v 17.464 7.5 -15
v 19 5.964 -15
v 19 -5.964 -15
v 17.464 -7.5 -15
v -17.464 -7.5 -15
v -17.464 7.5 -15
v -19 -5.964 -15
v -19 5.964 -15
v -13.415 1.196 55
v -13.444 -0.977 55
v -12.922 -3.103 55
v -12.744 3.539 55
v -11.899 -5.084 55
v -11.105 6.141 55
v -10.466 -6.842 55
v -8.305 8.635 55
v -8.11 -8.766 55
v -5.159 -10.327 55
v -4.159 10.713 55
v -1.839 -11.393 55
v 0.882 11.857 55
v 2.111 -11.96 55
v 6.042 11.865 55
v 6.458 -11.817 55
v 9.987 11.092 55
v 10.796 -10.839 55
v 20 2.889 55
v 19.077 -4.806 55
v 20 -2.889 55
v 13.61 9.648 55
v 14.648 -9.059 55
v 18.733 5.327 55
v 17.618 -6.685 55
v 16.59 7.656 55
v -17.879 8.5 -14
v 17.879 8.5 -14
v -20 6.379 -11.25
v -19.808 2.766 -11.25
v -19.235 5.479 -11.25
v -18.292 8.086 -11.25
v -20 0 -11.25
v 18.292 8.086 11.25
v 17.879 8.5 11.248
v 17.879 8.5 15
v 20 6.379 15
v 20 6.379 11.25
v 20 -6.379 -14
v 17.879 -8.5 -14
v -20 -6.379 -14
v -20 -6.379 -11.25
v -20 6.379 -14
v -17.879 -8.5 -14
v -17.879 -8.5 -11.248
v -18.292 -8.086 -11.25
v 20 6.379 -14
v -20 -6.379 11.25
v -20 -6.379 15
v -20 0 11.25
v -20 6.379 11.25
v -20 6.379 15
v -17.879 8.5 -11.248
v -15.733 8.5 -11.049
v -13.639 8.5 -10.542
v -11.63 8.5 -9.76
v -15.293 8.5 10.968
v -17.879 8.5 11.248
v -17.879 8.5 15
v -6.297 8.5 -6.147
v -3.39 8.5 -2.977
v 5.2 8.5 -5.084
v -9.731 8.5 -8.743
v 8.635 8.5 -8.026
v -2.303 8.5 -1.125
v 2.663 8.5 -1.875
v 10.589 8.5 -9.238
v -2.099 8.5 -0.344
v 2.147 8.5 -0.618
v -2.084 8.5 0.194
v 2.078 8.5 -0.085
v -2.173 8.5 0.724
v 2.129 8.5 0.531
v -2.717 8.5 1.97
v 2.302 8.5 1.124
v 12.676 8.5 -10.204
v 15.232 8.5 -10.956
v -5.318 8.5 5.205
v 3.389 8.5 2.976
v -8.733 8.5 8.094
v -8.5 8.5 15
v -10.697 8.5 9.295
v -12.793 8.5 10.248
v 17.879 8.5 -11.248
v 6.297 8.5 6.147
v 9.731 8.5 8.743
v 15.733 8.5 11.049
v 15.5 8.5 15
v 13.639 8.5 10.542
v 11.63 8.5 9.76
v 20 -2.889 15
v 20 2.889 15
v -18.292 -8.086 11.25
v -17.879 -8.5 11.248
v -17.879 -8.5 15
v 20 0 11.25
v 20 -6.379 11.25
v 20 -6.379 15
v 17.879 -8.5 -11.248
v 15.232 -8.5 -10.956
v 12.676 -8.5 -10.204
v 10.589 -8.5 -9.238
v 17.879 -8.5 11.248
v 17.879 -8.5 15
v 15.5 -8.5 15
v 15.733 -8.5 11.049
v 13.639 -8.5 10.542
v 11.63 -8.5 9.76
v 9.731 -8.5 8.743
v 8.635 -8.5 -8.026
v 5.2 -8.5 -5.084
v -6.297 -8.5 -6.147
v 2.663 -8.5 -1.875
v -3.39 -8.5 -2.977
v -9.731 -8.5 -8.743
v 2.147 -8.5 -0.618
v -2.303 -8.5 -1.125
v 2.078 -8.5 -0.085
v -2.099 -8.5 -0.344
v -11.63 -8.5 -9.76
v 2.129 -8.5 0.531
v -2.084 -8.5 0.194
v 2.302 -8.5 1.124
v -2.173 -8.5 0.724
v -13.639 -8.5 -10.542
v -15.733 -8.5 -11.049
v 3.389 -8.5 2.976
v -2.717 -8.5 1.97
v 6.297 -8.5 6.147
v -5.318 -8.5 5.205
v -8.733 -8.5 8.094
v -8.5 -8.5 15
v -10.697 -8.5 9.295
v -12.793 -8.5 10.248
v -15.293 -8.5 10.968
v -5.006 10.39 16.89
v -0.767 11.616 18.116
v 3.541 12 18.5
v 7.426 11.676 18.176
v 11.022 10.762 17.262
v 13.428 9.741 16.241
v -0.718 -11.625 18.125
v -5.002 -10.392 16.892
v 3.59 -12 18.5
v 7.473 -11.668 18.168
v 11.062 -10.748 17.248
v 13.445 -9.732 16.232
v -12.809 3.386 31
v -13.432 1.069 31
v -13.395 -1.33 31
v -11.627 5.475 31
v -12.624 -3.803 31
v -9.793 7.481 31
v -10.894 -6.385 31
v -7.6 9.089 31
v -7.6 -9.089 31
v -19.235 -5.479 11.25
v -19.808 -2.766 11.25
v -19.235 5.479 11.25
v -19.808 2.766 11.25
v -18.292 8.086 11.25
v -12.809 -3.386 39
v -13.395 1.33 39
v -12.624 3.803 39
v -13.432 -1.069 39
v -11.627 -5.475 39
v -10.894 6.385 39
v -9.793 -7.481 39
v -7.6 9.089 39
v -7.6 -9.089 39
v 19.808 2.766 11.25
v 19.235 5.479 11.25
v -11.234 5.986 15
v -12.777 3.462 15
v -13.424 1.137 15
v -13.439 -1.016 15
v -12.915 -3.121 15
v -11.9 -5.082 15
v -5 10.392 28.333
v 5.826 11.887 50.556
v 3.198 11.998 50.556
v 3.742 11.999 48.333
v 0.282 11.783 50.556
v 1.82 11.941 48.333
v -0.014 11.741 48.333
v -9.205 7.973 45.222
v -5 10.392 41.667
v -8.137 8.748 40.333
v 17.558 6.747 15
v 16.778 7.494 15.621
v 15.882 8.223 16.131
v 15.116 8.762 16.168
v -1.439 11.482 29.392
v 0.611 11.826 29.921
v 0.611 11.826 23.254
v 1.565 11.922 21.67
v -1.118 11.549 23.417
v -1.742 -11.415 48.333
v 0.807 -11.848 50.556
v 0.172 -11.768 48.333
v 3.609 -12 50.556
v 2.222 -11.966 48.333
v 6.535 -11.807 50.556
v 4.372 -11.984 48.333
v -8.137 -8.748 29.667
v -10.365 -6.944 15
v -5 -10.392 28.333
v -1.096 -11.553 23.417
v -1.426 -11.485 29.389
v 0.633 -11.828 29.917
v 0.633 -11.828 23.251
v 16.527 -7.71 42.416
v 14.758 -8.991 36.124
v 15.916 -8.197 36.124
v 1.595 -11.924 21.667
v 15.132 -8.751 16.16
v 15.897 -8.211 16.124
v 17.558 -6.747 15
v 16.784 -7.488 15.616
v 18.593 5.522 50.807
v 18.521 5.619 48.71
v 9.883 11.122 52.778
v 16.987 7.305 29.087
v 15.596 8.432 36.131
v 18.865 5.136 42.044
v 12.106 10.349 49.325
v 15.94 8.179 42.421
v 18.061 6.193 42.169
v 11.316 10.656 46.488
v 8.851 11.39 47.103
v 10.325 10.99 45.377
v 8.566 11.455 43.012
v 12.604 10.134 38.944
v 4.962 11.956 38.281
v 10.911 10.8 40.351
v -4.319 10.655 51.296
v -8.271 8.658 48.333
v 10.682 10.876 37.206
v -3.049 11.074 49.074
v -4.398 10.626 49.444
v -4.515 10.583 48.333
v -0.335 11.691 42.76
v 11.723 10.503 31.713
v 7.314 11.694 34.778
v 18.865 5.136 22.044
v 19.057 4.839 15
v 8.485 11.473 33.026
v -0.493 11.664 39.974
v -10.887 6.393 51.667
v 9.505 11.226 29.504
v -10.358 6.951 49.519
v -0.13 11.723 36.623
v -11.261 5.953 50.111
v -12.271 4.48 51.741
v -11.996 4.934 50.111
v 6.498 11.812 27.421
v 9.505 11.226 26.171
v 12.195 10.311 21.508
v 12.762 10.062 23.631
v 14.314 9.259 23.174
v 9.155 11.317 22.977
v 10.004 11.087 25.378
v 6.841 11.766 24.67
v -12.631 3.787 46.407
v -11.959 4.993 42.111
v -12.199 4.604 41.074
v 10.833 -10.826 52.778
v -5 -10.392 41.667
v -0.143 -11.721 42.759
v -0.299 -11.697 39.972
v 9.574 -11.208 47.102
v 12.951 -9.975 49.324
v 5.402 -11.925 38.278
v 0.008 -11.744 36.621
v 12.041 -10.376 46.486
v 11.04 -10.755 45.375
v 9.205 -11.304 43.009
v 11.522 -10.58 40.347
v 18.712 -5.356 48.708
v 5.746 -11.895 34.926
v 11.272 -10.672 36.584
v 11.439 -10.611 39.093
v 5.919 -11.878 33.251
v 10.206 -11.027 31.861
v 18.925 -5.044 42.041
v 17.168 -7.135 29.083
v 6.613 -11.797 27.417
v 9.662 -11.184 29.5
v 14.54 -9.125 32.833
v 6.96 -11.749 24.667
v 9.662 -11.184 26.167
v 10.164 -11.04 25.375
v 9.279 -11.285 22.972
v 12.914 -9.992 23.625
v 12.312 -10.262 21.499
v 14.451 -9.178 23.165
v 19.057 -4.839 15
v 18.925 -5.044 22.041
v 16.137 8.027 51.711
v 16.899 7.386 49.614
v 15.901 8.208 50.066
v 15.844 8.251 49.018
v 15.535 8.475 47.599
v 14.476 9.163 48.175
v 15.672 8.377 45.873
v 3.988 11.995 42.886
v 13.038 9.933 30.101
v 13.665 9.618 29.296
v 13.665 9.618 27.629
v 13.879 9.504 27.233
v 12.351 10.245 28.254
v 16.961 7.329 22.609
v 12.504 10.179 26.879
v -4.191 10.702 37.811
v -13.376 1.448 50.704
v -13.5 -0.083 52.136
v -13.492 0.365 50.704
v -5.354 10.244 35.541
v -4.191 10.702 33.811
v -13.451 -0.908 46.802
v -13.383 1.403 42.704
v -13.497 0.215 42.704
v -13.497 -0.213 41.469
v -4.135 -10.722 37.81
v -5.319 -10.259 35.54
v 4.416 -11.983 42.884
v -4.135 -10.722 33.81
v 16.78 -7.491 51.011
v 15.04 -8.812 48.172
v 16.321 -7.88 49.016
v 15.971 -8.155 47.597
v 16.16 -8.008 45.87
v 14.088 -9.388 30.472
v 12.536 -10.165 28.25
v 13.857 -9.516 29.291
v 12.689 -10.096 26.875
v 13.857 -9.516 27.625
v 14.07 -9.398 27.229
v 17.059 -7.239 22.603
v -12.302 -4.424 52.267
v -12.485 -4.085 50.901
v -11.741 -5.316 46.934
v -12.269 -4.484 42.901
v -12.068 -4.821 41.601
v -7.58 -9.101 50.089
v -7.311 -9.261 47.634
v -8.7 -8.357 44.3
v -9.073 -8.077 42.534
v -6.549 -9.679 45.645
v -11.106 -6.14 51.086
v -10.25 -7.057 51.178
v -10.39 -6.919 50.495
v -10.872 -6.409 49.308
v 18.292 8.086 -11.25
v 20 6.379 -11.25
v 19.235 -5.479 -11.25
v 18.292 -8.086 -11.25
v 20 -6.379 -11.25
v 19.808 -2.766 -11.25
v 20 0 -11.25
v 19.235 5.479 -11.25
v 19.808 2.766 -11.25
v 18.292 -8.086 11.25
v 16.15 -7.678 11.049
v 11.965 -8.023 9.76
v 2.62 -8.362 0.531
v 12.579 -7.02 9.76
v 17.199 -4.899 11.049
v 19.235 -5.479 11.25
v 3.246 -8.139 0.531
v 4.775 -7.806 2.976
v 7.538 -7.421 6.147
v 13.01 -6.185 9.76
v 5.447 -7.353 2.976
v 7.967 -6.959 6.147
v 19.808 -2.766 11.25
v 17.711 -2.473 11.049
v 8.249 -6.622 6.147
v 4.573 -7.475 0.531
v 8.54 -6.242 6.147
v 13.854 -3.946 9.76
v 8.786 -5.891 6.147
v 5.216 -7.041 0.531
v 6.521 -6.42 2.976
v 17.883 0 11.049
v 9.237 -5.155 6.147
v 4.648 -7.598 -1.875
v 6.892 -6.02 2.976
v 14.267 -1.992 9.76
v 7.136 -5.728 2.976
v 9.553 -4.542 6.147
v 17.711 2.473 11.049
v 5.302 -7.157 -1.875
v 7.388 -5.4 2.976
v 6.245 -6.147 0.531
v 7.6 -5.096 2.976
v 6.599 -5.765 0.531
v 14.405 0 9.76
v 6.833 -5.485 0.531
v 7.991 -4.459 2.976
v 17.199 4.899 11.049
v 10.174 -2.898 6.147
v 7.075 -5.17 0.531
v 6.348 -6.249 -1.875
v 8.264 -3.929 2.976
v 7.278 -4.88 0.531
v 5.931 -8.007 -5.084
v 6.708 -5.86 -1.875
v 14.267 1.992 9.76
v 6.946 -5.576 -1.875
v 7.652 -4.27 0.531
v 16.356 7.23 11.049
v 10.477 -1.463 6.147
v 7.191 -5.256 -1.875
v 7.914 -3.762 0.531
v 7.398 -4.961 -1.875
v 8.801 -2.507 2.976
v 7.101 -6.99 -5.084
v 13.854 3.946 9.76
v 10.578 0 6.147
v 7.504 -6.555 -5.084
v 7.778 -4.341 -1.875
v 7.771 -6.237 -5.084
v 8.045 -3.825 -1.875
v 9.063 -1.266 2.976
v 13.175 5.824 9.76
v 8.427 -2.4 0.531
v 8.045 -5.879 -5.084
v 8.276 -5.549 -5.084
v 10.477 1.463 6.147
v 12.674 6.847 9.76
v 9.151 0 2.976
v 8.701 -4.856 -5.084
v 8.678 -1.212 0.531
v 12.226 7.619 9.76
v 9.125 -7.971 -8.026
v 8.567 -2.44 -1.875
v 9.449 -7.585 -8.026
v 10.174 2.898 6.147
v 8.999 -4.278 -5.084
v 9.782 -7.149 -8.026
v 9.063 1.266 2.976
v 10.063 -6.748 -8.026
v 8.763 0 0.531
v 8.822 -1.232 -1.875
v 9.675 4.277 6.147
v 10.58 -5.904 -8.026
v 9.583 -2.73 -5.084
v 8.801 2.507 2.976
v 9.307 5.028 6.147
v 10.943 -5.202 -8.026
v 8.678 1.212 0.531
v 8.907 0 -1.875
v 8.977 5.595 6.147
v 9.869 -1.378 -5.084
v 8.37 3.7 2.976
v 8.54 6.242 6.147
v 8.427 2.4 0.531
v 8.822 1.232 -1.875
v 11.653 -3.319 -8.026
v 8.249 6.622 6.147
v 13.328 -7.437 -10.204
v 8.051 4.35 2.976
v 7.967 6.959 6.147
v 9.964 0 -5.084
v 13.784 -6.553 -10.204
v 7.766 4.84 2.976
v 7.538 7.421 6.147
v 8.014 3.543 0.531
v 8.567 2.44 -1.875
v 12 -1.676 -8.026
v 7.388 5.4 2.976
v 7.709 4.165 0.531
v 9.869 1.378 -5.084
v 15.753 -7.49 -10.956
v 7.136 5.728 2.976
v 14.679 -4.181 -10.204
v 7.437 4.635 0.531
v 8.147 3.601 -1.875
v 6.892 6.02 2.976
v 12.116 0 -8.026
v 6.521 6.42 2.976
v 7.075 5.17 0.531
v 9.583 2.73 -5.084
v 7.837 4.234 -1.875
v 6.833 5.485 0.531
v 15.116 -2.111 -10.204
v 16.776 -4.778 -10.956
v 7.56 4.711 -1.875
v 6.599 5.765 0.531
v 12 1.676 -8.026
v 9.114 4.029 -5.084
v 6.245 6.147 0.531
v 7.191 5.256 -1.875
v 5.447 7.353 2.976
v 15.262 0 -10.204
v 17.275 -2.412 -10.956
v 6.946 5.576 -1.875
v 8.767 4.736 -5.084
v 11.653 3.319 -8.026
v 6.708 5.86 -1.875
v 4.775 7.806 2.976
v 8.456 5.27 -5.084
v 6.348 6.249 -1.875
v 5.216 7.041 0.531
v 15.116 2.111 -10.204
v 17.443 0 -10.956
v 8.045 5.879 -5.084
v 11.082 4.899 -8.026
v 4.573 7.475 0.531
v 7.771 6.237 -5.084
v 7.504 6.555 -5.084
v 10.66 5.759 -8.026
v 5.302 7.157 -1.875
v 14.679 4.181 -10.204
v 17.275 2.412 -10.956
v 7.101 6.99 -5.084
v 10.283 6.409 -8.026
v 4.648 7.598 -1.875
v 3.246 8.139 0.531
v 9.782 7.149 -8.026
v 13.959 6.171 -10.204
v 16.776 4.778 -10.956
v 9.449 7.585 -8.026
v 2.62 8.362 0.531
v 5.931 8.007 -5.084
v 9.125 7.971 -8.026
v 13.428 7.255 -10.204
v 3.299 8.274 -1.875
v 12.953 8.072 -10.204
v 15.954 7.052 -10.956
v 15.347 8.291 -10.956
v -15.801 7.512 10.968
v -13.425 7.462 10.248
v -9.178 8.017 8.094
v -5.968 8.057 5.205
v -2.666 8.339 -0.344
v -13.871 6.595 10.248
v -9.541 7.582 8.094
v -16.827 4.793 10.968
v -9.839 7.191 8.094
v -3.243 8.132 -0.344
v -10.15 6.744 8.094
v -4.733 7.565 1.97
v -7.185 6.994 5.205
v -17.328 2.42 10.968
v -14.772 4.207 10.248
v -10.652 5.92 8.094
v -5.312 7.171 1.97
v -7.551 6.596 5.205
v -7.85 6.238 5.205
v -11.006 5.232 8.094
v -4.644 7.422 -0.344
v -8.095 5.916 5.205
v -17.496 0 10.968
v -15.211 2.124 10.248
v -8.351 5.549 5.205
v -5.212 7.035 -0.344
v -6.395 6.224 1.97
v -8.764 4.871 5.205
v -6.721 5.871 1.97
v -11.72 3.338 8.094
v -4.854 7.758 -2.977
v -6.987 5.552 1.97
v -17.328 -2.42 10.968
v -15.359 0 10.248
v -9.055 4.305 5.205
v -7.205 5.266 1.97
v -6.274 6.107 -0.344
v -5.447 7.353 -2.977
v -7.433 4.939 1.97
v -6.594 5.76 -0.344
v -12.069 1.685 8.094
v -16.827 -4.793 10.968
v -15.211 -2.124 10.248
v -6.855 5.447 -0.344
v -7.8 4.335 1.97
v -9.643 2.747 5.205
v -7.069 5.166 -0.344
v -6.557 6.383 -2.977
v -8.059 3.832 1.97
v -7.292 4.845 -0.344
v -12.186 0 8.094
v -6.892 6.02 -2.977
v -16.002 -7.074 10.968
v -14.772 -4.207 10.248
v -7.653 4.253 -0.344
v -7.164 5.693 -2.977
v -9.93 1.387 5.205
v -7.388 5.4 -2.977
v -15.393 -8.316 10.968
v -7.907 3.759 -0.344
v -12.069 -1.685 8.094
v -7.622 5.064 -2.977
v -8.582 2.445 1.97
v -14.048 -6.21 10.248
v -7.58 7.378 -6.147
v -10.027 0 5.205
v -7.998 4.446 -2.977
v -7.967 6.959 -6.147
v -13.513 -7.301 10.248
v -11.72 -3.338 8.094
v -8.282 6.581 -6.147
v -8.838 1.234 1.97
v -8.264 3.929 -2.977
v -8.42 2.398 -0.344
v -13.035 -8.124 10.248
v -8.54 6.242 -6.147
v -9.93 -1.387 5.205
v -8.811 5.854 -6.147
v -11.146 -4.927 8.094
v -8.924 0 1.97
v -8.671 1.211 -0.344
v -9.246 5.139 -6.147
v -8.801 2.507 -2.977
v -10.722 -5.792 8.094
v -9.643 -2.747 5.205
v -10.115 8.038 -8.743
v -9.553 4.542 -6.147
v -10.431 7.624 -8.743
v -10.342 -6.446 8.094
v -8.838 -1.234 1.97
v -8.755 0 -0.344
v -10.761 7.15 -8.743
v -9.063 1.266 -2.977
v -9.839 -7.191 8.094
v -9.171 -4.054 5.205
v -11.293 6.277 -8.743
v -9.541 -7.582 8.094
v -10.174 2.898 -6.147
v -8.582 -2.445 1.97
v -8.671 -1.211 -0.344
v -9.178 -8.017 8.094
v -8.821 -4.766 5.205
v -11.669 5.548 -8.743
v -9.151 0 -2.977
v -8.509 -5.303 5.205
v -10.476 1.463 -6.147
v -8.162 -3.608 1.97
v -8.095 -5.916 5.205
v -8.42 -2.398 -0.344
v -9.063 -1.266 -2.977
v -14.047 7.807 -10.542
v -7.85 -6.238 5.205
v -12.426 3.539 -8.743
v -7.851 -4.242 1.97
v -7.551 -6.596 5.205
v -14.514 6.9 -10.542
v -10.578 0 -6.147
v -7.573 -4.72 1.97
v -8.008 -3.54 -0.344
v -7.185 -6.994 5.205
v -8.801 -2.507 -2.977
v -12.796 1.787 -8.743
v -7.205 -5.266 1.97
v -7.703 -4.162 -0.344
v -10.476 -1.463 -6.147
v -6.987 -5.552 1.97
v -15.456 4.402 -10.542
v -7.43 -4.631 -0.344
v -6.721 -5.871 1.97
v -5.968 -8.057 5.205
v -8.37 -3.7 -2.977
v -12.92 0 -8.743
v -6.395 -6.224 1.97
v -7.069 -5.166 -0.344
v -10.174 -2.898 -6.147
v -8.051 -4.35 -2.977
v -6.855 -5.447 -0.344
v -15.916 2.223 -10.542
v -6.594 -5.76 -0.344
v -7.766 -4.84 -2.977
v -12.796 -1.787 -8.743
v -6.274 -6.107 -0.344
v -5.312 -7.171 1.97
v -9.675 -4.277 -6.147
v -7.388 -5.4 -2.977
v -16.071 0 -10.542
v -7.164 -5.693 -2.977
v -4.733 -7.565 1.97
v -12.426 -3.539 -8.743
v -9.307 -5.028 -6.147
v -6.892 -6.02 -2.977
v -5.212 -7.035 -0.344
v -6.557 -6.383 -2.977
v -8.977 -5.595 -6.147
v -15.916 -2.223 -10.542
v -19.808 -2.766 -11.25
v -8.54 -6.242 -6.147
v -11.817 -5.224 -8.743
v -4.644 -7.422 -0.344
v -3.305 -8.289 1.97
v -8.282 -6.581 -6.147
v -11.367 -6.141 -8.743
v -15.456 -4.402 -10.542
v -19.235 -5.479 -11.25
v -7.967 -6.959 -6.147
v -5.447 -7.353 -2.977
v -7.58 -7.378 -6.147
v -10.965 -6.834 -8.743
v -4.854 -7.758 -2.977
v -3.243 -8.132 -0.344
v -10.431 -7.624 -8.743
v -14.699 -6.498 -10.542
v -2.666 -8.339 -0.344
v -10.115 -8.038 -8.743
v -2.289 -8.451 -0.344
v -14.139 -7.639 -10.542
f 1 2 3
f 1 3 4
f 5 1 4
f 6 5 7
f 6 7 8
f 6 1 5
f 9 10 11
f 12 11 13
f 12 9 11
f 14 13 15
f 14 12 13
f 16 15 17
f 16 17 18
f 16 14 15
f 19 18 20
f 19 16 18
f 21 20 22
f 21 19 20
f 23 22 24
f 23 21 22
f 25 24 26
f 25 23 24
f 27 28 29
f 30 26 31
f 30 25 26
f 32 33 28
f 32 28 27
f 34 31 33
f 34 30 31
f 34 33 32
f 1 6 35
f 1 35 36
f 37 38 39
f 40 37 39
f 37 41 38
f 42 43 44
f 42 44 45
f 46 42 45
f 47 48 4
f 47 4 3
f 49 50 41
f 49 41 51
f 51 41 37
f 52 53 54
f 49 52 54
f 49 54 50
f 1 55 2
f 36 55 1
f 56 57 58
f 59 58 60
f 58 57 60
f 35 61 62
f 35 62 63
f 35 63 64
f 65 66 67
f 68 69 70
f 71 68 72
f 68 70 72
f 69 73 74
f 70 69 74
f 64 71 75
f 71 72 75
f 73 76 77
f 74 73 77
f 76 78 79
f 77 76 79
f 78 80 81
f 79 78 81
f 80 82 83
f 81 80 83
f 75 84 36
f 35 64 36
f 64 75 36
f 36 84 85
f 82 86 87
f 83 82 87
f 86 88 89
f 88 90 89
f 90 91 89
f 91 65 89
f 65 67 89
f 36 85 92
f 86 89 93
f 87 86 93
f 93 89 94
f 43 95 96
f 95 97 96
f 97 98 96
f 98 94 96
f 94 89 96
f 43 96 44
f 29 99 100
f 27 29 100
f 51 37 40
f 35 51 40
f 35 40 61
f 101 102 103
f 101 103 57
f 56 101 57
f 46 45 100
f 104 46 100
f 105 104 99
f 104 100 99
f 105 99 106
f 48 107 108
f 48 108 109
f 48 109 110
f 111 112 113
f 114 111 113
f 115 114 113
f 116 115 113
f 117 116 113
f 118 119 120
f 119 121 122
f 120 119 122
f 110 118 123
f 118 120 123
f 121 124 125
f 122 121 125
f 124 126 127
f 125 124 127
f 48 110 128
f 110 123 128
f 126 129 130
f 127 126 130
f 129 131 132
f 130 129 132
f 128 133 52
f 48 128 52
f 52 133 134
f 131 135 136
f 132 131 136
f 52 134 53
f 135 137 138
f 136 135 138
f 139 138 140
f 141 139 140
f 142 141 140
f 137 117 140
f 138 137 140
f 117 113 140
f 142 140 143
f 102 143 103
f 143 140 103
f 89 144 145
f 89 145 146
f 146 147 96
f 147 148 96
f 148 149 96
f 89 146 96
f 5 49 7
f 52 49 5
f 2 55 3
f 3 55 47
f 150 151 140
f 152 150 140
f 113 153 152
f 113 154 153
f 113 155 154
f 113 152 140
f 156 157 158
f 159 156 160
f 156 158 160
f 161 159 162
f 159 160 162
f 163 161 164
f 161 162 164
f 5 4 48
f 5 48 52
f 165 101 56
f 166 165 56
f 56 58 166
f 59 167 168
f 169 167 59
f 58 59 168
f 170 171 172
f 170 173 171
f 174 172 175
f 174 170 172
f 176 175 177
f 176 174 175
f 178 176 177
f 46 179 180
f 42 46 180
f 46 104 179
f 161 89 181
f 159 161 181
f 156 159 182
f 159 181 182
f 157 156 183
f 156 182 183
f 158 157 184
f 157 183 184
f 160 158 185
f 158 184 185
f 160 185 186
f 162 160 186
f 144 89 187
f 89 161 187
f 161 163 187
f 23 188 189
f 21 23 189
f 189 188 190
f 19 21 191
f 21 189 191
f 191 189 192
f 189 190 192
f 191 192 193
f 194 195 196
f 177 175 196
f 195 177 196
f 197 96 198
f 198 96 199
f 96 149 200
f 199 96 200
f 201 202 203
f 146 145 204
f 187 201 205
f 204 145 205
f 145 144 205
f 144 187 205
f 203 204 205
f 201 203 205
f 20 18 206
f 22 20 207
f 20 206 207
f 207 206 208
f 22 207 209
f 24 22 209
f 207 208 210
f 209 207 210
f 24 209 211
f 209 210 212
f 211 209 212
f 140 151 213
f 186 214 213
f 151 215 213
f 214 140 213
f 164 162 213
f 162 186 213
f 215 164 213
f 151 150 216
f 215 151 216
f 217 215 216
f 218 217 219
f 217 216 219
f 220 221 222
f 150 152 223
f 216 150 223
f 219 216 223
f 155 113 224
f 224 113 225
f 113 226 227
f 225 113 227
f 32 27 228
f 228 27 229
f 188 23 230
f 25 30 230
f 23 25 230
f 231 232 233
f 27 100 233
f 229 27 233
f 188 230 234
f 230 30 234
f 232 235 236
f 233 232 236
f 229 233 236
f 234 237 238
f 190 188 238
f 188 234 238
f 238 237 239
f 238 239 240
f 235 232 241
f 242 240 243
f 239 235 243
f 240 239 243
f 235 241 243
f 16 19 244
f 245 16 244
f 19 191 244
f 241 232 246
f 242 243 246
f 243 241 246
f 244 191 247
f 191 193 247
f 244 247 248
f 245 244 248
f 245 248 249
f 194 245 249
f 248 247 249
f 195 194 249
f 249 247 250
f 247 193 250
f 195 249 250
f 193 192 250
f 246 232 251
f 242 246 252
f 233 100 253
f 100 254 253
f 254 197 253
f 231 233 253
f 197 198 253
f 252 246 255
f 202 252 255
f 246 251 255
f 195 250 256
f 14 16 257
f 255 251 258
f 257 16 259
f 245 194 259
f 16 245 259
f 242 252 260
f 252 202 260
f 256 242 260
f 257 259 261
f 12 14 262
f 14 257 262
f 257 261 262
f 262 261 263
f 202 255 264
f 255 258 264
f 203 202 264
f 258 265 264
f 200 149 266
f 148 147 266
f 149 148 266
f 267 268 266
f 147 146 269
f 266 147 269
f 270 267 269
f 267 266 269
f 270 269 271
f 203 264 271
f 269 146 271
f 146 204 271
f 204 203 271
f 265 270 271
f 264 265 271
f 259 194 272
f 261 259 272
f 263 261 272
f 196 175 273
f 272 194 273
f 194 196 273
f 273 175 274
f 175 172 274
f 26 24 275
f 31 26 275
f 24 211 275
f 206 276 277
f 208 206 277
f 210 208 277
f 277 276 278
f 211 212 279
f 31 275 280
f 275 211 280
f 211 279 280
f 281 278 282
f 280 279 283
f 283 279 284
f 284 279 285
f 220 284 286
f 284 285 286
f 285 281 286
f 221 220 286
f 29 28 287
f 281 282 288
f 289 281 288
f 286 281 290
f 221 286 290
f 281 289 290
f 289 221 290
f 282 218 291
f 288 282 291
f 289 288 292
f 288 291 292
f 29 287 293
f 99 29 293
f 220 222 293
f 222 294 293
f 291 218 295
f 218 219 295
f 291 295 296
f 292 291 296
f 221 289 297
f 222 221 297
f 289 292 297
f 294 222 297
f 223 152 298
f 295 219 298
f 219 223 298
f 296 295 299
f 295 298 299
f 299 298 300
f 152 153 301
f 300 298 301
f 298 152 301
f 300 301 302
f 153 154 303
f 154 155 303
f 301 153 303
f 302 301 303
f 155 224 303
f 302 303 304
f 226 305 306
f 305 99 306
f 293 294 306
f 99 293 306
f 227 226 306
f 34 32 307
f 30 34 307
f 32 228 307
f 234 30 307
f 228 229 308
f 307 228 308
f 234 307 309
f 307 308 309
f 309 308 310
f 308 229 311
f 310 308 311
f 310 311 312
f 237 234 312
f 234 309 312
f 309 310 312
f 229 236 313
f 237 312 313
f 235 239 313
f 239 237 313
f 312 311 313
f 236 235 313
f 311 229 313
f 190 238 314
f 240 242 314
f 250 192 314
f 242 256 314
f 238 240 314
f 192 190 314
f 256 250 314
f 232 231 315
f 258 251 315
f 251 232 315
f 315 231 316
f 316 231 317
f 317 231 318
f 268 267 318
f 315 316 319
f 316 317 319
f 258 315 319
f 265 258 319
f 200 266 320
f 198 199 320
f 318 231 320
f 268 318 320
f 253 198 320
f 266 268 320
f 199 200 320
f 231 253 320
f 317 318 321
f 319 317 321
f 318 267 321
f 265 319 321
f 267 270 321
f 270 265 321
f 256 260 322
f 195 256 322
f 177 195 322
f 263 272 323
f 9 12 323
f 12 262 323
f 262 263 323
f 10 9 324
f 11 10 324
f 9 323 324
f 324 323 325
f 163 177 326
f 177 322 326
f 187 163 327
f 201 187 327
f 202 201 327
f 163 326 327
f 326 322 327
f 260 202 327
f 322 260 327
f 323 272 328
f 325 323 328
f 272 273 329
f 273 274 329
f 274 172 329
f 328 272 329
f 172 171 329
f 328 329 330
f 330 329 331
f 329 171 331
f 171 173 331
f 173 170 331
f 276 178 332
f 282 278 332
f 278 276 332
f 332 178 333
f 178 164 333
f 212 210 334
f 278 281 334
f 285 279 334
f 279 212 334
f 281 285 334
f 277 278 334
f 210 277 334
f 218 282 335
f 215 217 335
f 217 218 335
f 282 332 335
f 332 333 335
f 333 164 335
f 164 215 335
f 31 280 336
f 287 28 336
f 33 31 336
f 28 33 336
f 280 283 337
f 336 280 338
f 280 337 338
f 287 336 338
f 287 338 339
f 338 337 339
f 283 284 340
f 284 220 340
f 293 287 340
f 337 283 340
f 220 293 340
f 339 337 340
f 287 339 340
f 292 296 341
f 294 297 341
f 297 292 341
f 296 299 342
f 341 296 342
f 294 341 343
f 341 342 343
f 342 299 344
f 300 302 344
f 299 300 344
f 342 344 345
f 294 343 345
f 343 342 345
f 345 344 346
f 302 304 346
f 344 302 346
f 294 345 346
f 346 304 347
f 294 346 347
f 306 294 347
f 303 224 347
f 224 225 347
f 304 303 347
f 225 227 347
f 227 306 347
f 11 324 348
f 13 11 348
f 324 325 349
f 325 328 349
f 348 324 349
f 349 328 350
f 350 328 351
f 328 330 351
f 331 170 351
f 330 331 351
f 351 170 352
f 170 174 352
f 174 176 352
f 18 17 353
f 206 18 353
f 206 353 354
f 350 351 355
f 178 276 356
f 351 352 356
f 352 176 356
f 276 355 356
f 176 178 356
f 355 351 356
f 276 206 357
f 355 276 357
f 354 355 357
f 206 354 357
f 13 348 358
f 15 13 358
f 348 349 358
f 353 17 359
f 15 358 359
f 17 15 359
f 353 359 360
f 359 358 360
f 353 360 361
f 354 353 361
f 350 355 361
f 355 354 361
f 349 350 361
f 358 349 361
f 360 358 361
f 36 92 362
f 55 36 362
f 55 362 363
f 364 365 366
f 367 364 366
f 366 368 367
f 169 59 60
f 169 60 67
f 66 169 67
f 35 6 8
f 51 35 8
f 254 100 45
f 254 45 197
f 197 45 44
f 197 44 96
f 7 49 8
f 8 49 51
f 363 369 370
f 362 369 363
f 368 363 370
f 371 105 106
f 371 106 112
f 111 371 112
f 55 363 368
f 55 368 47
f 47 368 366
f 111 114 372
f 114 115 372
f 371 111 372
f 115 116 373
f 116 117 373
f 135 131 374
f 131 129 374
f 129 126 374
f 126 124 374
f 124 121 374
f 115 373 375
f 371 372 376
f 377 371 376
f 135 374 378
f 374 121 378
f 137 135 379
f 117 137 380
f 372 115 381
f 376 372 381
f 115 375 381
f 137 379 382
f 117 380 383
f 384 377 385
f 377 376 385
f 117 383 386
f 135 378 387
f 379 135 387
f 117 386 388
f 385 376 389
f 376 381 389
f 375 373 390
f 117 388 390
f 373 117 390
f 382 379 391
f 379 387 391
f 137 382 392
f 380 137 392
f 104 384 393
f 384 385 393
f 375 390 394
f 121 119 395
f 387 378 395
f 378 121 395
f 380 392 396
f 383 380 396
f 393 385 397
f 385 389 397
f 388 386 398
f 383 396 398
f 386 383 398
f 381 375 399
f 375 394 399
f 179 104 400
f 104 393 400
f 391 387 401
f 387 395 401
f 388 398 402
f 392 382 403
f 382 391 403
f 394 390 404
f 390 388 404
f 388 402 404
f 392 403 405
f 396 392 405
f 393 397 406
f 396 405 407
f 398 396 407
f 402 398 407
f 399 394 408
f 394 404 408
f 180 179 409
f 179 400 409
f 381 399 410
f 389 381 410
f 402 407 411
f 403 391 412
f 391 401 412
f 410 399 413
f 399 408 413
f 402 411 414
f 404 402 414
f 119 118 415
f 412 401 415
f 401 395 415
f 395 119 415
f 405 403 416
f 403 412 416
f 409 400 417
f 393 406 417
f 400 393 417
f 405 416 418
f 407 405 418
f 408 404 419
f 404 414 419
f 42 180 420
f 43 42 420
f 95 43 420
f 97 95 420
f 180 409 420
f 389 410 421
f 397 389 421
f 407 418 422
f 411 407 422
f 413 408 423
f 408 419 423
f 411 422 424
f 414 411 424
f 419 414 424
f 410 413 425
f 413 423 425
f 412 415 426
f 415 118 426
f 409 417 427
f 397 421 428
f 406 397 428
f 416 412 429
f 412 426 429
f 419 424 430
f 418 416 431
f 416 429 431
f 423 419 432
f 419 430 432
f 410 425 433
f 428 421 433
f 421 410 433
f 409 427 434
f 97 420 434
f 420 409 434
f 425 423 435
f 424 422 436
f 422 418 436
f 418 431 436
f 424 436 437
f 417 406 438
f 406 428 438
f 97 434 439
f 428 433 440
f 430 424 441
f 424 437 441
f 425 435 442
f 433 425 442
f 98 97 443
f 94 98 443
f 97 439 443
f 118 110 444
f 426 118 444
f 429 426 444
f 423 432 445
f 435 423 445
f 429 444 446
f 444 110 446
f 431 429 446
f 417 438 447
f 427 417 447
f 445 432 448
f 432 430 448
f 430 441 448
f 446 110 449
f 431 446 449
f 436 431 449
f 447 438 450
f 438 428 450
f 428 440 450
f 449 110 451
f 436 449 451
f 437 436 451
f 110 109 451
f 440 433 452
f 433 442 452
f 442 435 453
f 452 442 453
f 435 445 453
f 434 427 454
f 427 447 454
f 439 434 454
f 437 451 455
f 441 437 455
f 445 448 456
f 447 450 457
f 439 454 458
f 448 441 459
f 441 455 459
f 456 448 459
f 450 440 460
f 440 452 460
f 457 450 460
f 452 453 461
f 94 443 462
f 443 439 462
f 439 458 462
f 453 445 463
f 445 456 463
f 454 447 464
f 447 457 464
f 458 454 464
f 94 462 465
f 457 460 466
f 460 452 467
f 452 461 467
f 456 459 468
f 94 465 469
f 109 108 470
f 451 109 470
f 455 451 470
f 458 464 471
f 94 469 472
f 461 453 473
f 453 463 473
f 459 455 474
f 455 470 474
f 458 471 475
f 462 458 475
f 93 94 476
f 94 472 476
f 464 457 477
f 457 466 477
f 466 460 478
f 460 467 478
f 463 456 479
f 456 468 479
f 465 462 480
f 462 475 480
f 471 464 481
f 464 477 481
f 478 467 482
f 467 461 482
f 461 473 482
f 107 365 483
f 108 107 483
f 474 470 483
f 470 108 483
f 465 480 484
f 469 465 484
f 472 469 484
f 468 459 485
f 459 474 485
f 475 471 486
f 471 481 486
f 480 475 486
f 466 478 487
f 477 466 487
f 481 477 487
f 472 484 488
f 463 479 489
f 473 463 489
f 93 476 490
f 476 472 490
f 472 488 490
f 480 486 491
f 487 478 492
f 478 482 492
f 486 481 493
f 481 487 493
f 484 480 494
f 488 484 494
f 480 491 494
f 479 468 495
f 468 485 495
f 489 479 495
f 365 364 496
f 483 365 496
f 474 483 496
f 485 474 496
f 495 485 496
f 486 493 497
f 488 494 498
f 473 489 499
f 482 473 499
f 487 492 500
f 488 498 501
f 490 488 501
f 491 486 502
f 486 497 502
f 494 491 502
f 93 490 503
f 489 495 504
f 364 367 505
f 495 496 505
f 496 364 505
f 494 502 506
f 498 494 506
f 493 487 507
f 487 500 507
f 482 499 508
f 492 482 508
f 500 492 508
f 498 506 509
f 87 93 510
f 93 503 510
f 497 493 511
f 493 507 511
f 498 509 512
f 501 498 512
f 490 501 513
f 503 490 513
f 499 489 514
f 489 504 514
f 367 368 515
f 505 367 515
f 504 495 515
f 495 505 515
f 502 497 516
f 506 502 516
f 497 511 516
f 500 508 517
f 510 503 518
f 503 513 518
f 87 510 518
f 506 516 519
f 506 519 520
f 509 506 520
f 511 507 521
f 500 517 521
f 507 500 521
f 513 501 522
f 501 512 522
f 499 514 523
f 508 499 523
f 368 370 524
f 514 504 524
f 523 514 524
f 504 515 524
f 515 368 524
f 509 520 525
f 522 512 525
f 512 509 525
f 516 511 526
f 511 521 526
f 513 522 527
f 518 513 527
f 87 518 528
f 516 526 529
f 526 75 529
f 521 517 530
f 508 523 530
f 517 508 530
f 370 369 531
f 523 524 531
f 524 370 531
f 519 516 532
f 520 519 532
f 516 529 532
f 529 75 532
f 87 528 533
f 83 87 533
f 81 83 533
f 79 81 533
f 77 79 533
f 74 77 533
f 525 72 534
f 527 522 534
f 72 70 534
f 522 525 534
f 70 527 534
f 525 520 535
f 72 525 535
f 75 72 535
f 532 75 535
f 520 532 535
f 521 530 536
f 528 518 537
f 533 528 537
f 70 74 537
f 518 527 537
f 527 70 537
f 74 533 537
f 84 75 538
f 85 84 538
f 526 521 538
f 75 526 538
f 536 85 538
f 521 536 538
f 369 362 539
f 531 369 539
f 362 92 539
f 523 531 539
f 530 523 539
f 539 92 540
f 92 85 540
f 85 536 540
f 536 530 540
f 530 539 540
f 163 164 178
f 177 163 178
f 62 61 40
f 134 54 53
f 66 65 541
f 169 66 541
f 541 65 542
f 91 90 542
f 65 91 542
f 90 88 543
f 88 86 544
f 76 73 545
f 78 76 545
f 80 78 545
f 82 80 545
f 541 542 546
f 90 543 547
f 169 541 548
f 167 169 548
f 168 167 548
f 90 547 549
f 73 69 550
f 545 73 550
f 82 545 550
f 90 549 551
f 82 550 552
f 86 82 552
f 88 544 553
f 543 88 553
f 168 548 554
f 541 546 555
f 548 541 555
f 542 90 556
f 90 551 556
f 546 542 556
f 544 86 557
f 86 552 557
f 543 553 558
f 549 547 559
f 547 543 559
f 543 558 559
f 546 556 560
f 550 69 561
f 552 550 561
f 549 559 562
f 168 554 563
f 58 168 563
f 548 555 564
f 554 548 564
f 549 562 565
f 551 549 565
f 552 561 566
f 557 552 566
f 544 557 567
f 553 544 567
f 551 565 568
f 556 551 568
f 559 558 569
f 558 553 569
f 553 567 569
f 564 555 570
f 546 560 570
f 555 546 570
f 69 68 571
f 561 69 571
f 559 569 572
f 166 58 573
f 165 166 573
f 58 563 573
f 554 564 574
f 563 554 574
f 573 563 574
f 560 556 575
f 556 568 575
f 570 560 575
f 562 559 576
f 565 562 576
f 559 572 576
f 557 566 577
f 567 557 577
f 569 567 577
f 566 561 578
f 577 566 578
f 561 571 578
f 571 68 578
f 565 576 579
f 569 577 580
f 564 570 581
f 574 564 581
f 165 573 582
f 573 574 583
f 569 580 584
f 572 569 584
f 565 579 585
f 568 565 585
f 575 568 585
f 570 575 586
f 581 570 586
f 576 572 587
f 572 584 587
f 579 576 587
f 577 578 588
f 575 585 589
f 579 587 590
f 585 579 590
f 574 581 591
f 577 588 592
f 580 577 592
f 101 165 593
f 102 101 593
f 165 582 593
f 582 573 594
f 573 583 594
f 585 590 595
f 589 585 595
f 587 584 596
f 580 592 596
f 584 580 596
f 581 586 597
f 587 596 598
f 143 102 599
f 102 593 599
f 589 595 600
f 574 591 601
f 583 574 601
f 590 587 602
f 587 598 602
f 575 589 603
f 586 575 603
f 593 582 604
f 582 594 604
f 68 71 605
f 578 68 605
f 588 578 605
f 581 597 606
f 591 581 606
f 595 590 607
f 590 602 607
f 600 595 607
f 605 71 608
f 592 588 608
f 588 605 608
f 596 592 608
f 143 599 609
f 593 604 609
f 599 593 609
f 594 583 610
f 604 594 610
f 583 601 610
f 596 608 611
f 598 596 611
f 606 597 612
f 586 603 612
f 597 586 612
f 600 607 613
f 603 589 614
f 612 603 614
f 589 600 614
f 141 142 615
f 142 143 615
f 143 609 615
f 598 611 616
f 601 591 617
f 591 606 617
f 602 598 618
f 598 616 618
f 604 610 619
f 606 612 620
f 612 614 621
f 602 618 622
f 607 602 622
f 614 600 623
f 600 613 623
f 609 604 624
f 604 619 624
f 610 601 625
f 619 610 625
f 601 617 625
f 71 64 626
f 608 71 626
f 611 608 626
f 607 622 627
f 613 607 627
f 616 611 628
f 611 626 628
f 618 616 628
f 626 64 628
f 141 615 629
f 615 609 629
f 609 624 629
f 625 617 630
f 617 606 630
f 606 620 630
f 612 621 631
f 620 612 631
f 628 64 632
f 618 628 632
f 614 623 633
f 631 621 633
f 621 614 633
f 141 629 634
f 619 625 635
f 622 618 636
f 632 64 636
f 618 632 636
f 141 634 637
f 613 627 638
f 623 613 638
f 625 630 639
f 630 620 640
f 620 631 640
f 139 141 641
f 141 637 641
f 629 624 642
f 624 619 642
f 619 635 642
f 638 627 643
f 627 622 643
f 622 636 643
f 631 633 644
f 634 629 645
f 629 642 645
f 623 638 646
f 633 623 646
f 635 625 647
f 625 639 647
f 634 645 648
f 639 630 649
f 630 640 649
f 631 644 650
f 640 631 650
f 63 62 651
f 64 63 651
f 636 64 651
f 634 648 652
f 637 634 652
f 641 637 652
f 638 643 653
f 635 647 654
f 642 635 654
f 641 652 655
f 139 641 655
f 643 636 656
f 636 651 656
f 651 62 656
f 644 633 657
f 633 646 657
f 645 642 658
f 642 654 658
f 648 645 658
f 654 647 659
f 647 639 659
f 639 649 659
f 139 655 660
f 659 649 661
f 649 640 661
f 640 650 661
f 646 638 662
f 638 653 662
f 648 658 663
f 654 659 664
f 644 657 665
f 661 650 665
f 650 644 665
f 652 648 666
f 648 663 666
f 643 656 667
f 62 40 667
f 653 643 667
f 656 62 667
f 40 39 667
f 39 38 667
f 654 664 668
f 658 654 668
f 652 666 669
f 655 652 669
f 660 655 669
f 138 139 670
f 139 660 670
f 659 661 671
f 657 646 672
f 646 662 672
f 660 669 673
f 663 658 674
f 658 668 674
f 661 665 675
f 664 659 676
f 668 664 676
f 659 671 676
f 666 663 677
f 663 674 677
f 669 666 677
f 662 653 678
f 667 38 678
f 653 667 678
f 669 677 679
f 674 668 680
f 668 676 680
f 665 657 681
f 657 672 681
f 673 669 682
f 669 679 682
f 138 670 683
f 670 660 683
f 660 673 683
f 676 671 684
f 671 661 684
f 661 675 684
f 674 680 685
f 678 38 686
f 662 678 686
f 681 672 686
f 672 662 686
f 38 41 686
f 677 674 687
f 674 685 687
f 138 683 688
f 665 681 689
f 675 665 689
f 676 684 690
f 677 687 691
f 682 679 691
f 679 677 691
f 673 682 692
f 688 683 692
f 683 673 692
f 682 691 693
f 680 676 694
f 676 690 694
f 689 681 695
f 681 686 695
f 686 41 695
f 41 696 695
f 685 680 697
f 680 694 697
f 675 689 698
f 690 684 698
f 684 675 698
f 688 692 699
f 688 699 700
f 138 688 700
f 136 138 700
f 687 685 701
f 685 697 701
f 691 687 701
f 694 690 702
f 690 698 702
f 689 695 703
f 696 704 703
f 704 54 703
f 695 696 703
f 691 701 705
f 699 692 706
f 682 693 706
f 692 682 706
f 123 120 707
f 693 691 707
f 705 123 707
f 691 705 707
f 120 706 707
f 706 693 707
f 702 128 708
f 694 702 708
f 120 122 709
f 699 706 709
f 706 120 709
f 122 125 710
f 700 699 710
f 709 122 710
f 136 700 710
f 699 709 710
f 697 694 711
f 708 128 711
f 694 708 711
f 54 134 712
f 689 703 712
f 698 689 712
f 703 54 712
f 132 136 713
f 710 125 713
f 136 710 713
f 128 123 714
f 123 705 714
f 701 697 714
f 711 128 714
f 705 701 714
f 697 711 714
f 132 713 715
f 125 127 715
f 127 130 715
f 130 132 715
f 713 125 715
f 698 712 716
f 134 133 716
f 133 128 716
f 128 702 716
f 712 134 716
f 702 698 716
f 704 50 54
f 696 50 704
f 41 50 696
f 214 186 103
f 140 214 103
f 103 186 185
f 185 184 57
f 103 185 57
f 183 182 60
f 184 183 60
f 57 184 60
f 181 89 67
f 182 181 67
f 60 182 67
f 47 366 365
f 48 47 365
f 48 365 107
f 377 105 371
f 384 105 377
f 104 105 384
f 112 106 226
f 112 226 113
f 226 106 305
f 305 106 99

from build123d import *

# Parameters (mm, degrees)
PAD_DEPTH            = 15
SKETCH002_W          = 71.950028
SKETCH002_H          = 37.97071
POCKET_DEPTH         = 15.001
POCKET_DEPTH_BACK    = 15.001
PAD001_DEPTH         = 40
SKETCH004_W          = 12.757359
SKETCH004_H          = 12.75736
POCKET001_DEPTH      = 40.001
SKETCH005_W          = 6
SKETCH005_H          = 8
POCKET002_DEPTH      = 12.001
POCKET002_DEPTH_BACK = 12.001
POCKET003_DEPTH      = 188.238927
POCKET003_DEPTH_BACK = 188.238927
CHAMFER_SIZE         = 1


with BuildPart() as part:
    # Sketch → Pad (new body, symmetric)
    with BuildSketch(Plane.XY):
        Polygon((-20, 8.5), (20, 8.5), (20, 8.5), (20, -8.5), (-20, -8.5), align=None)
    extrude(amount=PAD_DEPTH, both=True)

    # Sketch001 → Groove (revolve, cut)
    with BuildSketch(Plane.XZ):
        with BuildLine():
            ThreePointArc((20, 11.25), (8.75, 0), (20, -11.25))
            Line((42.5, -11.25), (20, -11.25))
            Line((42.5, 11.25), (42.5, -11.25))
            Line((20, 11.25), (42.5, 11.25))
        make_face()
    revolve(axis=Axis((0, 0, 0), (0, 0, 1)), mode=Mode.SUBTRACT)

    # Sketch002 → Pocket (cut, two sides)
    with BuildSketch(Plane.XY) as pocket_sk:
        Rectangle(SKETCH002_W, SKETCH002_H)
        Polygon((-20, 6.37868), (-17.87868, 8.5), (17.87868, 8.5), (20, 6.37868), (20, -6.37868), (17.87868, -8.5), (-17.87868, -8.5), (-20, -6.37868), align=None, mode=Mode.SUBTRACT)
    extrude(amount=-POCKET_DEPTH, mode=Mode.SUBTRACT)
    extrude(pocket_sk.sketch, amount=POCKET_DEPTH_BACK, mode=Mode.SUBTRACT)

    # Sketch003 (on Face6 of Pocket) → Pad001 (join)
    with BuildSketch(Plane.XY.offset(15)):
        with BuildLine():
            add(Edge.make_bspline(
                [(20.5, 0), (20.5, 20.78461), (-5, 10.392305), (-30.5, 0), (-5, -10.392305), (20.5, -20.78461), (20.5, 0)],
                knots=[0, 0, 0, 2.094395, 2.094395, 4.18879, 4.18879, 6.283185, 6.283185, 6.283185], degree=2, weights=[1, 0.5, 1, 0.5, 1, 0.5, 1]))
        make_face()
    extrude(amount=PAD001_DEPTH)

    # Sketch004 (on Edge33 of Pad001) → Pocket001 (cut, through all)
    with BuildSketch(Plane.XY.offset(15)):
        with Locations((26.37868, 0)):
            Rectangle(SKETCH004_W, SKETCH004_H)
    extrude(amount=POCKET001_DEPTH, mode=Mode.SUBTRACT)

    # Sketch005 → Pocket002 (cut, two sides)
    with BuildSketch(Plane.XZ) as pocket002_sk:
        with Locations((-10.599911, 35)):
            Rectangle(SKETCH005_W, SKETCH005_H)
    extrude(amount=-POCKET002_DEPTH, mode=Mode.SUBTRACT)
    extrude(pocket002_sk.sketch, amount=POCKET002_DEPTH_BACK, mode=Mode.SUBTRACT)

    # Sketch006 → Pocket003 (cut, two sides)
    with BuildSketch(Plane.YZ) as pocket003_sk:
        Polygon((-12.099236, 18.599236), (-8.5, 15), (-12.099236, 15), align=None)
    pocket003 = extrude(amount=-POCKET003_DEPTH, mode=Mode.SUBTRACT) + extrude(pocket003_sk.sketch, amount=POCKET003_DEPTH_BACK, mode=Mode.SUBTRACT)

    # Mirrored: Pocket003 across Sketch006 V_Axis
    add(pocket003.mirror(Plane(origin=(0, 0, 0), x_dir=(1, 0, 0), z_dir=(0, 1, 0))), mode=Mode.SUBTRACT)

    # Chamfer
    chamfer_edges = [part.edges().sort_by_distance(p)[0] for p in [
        (0, 8.5, -15),
        (18.93934, 7.43934, -15),
        (20, 0, -15),
        (18.93934, -7.43934, -15),
        (0, -8.5, -15),
        (-18.93934, -7.43934, -15),
        (-20, 0, -15),
        (-18.93934, 7.43934, -15),
    ]]
    chamfer(chamfer_edges, length=CHAMFER_SIZE)


solid = part.part
